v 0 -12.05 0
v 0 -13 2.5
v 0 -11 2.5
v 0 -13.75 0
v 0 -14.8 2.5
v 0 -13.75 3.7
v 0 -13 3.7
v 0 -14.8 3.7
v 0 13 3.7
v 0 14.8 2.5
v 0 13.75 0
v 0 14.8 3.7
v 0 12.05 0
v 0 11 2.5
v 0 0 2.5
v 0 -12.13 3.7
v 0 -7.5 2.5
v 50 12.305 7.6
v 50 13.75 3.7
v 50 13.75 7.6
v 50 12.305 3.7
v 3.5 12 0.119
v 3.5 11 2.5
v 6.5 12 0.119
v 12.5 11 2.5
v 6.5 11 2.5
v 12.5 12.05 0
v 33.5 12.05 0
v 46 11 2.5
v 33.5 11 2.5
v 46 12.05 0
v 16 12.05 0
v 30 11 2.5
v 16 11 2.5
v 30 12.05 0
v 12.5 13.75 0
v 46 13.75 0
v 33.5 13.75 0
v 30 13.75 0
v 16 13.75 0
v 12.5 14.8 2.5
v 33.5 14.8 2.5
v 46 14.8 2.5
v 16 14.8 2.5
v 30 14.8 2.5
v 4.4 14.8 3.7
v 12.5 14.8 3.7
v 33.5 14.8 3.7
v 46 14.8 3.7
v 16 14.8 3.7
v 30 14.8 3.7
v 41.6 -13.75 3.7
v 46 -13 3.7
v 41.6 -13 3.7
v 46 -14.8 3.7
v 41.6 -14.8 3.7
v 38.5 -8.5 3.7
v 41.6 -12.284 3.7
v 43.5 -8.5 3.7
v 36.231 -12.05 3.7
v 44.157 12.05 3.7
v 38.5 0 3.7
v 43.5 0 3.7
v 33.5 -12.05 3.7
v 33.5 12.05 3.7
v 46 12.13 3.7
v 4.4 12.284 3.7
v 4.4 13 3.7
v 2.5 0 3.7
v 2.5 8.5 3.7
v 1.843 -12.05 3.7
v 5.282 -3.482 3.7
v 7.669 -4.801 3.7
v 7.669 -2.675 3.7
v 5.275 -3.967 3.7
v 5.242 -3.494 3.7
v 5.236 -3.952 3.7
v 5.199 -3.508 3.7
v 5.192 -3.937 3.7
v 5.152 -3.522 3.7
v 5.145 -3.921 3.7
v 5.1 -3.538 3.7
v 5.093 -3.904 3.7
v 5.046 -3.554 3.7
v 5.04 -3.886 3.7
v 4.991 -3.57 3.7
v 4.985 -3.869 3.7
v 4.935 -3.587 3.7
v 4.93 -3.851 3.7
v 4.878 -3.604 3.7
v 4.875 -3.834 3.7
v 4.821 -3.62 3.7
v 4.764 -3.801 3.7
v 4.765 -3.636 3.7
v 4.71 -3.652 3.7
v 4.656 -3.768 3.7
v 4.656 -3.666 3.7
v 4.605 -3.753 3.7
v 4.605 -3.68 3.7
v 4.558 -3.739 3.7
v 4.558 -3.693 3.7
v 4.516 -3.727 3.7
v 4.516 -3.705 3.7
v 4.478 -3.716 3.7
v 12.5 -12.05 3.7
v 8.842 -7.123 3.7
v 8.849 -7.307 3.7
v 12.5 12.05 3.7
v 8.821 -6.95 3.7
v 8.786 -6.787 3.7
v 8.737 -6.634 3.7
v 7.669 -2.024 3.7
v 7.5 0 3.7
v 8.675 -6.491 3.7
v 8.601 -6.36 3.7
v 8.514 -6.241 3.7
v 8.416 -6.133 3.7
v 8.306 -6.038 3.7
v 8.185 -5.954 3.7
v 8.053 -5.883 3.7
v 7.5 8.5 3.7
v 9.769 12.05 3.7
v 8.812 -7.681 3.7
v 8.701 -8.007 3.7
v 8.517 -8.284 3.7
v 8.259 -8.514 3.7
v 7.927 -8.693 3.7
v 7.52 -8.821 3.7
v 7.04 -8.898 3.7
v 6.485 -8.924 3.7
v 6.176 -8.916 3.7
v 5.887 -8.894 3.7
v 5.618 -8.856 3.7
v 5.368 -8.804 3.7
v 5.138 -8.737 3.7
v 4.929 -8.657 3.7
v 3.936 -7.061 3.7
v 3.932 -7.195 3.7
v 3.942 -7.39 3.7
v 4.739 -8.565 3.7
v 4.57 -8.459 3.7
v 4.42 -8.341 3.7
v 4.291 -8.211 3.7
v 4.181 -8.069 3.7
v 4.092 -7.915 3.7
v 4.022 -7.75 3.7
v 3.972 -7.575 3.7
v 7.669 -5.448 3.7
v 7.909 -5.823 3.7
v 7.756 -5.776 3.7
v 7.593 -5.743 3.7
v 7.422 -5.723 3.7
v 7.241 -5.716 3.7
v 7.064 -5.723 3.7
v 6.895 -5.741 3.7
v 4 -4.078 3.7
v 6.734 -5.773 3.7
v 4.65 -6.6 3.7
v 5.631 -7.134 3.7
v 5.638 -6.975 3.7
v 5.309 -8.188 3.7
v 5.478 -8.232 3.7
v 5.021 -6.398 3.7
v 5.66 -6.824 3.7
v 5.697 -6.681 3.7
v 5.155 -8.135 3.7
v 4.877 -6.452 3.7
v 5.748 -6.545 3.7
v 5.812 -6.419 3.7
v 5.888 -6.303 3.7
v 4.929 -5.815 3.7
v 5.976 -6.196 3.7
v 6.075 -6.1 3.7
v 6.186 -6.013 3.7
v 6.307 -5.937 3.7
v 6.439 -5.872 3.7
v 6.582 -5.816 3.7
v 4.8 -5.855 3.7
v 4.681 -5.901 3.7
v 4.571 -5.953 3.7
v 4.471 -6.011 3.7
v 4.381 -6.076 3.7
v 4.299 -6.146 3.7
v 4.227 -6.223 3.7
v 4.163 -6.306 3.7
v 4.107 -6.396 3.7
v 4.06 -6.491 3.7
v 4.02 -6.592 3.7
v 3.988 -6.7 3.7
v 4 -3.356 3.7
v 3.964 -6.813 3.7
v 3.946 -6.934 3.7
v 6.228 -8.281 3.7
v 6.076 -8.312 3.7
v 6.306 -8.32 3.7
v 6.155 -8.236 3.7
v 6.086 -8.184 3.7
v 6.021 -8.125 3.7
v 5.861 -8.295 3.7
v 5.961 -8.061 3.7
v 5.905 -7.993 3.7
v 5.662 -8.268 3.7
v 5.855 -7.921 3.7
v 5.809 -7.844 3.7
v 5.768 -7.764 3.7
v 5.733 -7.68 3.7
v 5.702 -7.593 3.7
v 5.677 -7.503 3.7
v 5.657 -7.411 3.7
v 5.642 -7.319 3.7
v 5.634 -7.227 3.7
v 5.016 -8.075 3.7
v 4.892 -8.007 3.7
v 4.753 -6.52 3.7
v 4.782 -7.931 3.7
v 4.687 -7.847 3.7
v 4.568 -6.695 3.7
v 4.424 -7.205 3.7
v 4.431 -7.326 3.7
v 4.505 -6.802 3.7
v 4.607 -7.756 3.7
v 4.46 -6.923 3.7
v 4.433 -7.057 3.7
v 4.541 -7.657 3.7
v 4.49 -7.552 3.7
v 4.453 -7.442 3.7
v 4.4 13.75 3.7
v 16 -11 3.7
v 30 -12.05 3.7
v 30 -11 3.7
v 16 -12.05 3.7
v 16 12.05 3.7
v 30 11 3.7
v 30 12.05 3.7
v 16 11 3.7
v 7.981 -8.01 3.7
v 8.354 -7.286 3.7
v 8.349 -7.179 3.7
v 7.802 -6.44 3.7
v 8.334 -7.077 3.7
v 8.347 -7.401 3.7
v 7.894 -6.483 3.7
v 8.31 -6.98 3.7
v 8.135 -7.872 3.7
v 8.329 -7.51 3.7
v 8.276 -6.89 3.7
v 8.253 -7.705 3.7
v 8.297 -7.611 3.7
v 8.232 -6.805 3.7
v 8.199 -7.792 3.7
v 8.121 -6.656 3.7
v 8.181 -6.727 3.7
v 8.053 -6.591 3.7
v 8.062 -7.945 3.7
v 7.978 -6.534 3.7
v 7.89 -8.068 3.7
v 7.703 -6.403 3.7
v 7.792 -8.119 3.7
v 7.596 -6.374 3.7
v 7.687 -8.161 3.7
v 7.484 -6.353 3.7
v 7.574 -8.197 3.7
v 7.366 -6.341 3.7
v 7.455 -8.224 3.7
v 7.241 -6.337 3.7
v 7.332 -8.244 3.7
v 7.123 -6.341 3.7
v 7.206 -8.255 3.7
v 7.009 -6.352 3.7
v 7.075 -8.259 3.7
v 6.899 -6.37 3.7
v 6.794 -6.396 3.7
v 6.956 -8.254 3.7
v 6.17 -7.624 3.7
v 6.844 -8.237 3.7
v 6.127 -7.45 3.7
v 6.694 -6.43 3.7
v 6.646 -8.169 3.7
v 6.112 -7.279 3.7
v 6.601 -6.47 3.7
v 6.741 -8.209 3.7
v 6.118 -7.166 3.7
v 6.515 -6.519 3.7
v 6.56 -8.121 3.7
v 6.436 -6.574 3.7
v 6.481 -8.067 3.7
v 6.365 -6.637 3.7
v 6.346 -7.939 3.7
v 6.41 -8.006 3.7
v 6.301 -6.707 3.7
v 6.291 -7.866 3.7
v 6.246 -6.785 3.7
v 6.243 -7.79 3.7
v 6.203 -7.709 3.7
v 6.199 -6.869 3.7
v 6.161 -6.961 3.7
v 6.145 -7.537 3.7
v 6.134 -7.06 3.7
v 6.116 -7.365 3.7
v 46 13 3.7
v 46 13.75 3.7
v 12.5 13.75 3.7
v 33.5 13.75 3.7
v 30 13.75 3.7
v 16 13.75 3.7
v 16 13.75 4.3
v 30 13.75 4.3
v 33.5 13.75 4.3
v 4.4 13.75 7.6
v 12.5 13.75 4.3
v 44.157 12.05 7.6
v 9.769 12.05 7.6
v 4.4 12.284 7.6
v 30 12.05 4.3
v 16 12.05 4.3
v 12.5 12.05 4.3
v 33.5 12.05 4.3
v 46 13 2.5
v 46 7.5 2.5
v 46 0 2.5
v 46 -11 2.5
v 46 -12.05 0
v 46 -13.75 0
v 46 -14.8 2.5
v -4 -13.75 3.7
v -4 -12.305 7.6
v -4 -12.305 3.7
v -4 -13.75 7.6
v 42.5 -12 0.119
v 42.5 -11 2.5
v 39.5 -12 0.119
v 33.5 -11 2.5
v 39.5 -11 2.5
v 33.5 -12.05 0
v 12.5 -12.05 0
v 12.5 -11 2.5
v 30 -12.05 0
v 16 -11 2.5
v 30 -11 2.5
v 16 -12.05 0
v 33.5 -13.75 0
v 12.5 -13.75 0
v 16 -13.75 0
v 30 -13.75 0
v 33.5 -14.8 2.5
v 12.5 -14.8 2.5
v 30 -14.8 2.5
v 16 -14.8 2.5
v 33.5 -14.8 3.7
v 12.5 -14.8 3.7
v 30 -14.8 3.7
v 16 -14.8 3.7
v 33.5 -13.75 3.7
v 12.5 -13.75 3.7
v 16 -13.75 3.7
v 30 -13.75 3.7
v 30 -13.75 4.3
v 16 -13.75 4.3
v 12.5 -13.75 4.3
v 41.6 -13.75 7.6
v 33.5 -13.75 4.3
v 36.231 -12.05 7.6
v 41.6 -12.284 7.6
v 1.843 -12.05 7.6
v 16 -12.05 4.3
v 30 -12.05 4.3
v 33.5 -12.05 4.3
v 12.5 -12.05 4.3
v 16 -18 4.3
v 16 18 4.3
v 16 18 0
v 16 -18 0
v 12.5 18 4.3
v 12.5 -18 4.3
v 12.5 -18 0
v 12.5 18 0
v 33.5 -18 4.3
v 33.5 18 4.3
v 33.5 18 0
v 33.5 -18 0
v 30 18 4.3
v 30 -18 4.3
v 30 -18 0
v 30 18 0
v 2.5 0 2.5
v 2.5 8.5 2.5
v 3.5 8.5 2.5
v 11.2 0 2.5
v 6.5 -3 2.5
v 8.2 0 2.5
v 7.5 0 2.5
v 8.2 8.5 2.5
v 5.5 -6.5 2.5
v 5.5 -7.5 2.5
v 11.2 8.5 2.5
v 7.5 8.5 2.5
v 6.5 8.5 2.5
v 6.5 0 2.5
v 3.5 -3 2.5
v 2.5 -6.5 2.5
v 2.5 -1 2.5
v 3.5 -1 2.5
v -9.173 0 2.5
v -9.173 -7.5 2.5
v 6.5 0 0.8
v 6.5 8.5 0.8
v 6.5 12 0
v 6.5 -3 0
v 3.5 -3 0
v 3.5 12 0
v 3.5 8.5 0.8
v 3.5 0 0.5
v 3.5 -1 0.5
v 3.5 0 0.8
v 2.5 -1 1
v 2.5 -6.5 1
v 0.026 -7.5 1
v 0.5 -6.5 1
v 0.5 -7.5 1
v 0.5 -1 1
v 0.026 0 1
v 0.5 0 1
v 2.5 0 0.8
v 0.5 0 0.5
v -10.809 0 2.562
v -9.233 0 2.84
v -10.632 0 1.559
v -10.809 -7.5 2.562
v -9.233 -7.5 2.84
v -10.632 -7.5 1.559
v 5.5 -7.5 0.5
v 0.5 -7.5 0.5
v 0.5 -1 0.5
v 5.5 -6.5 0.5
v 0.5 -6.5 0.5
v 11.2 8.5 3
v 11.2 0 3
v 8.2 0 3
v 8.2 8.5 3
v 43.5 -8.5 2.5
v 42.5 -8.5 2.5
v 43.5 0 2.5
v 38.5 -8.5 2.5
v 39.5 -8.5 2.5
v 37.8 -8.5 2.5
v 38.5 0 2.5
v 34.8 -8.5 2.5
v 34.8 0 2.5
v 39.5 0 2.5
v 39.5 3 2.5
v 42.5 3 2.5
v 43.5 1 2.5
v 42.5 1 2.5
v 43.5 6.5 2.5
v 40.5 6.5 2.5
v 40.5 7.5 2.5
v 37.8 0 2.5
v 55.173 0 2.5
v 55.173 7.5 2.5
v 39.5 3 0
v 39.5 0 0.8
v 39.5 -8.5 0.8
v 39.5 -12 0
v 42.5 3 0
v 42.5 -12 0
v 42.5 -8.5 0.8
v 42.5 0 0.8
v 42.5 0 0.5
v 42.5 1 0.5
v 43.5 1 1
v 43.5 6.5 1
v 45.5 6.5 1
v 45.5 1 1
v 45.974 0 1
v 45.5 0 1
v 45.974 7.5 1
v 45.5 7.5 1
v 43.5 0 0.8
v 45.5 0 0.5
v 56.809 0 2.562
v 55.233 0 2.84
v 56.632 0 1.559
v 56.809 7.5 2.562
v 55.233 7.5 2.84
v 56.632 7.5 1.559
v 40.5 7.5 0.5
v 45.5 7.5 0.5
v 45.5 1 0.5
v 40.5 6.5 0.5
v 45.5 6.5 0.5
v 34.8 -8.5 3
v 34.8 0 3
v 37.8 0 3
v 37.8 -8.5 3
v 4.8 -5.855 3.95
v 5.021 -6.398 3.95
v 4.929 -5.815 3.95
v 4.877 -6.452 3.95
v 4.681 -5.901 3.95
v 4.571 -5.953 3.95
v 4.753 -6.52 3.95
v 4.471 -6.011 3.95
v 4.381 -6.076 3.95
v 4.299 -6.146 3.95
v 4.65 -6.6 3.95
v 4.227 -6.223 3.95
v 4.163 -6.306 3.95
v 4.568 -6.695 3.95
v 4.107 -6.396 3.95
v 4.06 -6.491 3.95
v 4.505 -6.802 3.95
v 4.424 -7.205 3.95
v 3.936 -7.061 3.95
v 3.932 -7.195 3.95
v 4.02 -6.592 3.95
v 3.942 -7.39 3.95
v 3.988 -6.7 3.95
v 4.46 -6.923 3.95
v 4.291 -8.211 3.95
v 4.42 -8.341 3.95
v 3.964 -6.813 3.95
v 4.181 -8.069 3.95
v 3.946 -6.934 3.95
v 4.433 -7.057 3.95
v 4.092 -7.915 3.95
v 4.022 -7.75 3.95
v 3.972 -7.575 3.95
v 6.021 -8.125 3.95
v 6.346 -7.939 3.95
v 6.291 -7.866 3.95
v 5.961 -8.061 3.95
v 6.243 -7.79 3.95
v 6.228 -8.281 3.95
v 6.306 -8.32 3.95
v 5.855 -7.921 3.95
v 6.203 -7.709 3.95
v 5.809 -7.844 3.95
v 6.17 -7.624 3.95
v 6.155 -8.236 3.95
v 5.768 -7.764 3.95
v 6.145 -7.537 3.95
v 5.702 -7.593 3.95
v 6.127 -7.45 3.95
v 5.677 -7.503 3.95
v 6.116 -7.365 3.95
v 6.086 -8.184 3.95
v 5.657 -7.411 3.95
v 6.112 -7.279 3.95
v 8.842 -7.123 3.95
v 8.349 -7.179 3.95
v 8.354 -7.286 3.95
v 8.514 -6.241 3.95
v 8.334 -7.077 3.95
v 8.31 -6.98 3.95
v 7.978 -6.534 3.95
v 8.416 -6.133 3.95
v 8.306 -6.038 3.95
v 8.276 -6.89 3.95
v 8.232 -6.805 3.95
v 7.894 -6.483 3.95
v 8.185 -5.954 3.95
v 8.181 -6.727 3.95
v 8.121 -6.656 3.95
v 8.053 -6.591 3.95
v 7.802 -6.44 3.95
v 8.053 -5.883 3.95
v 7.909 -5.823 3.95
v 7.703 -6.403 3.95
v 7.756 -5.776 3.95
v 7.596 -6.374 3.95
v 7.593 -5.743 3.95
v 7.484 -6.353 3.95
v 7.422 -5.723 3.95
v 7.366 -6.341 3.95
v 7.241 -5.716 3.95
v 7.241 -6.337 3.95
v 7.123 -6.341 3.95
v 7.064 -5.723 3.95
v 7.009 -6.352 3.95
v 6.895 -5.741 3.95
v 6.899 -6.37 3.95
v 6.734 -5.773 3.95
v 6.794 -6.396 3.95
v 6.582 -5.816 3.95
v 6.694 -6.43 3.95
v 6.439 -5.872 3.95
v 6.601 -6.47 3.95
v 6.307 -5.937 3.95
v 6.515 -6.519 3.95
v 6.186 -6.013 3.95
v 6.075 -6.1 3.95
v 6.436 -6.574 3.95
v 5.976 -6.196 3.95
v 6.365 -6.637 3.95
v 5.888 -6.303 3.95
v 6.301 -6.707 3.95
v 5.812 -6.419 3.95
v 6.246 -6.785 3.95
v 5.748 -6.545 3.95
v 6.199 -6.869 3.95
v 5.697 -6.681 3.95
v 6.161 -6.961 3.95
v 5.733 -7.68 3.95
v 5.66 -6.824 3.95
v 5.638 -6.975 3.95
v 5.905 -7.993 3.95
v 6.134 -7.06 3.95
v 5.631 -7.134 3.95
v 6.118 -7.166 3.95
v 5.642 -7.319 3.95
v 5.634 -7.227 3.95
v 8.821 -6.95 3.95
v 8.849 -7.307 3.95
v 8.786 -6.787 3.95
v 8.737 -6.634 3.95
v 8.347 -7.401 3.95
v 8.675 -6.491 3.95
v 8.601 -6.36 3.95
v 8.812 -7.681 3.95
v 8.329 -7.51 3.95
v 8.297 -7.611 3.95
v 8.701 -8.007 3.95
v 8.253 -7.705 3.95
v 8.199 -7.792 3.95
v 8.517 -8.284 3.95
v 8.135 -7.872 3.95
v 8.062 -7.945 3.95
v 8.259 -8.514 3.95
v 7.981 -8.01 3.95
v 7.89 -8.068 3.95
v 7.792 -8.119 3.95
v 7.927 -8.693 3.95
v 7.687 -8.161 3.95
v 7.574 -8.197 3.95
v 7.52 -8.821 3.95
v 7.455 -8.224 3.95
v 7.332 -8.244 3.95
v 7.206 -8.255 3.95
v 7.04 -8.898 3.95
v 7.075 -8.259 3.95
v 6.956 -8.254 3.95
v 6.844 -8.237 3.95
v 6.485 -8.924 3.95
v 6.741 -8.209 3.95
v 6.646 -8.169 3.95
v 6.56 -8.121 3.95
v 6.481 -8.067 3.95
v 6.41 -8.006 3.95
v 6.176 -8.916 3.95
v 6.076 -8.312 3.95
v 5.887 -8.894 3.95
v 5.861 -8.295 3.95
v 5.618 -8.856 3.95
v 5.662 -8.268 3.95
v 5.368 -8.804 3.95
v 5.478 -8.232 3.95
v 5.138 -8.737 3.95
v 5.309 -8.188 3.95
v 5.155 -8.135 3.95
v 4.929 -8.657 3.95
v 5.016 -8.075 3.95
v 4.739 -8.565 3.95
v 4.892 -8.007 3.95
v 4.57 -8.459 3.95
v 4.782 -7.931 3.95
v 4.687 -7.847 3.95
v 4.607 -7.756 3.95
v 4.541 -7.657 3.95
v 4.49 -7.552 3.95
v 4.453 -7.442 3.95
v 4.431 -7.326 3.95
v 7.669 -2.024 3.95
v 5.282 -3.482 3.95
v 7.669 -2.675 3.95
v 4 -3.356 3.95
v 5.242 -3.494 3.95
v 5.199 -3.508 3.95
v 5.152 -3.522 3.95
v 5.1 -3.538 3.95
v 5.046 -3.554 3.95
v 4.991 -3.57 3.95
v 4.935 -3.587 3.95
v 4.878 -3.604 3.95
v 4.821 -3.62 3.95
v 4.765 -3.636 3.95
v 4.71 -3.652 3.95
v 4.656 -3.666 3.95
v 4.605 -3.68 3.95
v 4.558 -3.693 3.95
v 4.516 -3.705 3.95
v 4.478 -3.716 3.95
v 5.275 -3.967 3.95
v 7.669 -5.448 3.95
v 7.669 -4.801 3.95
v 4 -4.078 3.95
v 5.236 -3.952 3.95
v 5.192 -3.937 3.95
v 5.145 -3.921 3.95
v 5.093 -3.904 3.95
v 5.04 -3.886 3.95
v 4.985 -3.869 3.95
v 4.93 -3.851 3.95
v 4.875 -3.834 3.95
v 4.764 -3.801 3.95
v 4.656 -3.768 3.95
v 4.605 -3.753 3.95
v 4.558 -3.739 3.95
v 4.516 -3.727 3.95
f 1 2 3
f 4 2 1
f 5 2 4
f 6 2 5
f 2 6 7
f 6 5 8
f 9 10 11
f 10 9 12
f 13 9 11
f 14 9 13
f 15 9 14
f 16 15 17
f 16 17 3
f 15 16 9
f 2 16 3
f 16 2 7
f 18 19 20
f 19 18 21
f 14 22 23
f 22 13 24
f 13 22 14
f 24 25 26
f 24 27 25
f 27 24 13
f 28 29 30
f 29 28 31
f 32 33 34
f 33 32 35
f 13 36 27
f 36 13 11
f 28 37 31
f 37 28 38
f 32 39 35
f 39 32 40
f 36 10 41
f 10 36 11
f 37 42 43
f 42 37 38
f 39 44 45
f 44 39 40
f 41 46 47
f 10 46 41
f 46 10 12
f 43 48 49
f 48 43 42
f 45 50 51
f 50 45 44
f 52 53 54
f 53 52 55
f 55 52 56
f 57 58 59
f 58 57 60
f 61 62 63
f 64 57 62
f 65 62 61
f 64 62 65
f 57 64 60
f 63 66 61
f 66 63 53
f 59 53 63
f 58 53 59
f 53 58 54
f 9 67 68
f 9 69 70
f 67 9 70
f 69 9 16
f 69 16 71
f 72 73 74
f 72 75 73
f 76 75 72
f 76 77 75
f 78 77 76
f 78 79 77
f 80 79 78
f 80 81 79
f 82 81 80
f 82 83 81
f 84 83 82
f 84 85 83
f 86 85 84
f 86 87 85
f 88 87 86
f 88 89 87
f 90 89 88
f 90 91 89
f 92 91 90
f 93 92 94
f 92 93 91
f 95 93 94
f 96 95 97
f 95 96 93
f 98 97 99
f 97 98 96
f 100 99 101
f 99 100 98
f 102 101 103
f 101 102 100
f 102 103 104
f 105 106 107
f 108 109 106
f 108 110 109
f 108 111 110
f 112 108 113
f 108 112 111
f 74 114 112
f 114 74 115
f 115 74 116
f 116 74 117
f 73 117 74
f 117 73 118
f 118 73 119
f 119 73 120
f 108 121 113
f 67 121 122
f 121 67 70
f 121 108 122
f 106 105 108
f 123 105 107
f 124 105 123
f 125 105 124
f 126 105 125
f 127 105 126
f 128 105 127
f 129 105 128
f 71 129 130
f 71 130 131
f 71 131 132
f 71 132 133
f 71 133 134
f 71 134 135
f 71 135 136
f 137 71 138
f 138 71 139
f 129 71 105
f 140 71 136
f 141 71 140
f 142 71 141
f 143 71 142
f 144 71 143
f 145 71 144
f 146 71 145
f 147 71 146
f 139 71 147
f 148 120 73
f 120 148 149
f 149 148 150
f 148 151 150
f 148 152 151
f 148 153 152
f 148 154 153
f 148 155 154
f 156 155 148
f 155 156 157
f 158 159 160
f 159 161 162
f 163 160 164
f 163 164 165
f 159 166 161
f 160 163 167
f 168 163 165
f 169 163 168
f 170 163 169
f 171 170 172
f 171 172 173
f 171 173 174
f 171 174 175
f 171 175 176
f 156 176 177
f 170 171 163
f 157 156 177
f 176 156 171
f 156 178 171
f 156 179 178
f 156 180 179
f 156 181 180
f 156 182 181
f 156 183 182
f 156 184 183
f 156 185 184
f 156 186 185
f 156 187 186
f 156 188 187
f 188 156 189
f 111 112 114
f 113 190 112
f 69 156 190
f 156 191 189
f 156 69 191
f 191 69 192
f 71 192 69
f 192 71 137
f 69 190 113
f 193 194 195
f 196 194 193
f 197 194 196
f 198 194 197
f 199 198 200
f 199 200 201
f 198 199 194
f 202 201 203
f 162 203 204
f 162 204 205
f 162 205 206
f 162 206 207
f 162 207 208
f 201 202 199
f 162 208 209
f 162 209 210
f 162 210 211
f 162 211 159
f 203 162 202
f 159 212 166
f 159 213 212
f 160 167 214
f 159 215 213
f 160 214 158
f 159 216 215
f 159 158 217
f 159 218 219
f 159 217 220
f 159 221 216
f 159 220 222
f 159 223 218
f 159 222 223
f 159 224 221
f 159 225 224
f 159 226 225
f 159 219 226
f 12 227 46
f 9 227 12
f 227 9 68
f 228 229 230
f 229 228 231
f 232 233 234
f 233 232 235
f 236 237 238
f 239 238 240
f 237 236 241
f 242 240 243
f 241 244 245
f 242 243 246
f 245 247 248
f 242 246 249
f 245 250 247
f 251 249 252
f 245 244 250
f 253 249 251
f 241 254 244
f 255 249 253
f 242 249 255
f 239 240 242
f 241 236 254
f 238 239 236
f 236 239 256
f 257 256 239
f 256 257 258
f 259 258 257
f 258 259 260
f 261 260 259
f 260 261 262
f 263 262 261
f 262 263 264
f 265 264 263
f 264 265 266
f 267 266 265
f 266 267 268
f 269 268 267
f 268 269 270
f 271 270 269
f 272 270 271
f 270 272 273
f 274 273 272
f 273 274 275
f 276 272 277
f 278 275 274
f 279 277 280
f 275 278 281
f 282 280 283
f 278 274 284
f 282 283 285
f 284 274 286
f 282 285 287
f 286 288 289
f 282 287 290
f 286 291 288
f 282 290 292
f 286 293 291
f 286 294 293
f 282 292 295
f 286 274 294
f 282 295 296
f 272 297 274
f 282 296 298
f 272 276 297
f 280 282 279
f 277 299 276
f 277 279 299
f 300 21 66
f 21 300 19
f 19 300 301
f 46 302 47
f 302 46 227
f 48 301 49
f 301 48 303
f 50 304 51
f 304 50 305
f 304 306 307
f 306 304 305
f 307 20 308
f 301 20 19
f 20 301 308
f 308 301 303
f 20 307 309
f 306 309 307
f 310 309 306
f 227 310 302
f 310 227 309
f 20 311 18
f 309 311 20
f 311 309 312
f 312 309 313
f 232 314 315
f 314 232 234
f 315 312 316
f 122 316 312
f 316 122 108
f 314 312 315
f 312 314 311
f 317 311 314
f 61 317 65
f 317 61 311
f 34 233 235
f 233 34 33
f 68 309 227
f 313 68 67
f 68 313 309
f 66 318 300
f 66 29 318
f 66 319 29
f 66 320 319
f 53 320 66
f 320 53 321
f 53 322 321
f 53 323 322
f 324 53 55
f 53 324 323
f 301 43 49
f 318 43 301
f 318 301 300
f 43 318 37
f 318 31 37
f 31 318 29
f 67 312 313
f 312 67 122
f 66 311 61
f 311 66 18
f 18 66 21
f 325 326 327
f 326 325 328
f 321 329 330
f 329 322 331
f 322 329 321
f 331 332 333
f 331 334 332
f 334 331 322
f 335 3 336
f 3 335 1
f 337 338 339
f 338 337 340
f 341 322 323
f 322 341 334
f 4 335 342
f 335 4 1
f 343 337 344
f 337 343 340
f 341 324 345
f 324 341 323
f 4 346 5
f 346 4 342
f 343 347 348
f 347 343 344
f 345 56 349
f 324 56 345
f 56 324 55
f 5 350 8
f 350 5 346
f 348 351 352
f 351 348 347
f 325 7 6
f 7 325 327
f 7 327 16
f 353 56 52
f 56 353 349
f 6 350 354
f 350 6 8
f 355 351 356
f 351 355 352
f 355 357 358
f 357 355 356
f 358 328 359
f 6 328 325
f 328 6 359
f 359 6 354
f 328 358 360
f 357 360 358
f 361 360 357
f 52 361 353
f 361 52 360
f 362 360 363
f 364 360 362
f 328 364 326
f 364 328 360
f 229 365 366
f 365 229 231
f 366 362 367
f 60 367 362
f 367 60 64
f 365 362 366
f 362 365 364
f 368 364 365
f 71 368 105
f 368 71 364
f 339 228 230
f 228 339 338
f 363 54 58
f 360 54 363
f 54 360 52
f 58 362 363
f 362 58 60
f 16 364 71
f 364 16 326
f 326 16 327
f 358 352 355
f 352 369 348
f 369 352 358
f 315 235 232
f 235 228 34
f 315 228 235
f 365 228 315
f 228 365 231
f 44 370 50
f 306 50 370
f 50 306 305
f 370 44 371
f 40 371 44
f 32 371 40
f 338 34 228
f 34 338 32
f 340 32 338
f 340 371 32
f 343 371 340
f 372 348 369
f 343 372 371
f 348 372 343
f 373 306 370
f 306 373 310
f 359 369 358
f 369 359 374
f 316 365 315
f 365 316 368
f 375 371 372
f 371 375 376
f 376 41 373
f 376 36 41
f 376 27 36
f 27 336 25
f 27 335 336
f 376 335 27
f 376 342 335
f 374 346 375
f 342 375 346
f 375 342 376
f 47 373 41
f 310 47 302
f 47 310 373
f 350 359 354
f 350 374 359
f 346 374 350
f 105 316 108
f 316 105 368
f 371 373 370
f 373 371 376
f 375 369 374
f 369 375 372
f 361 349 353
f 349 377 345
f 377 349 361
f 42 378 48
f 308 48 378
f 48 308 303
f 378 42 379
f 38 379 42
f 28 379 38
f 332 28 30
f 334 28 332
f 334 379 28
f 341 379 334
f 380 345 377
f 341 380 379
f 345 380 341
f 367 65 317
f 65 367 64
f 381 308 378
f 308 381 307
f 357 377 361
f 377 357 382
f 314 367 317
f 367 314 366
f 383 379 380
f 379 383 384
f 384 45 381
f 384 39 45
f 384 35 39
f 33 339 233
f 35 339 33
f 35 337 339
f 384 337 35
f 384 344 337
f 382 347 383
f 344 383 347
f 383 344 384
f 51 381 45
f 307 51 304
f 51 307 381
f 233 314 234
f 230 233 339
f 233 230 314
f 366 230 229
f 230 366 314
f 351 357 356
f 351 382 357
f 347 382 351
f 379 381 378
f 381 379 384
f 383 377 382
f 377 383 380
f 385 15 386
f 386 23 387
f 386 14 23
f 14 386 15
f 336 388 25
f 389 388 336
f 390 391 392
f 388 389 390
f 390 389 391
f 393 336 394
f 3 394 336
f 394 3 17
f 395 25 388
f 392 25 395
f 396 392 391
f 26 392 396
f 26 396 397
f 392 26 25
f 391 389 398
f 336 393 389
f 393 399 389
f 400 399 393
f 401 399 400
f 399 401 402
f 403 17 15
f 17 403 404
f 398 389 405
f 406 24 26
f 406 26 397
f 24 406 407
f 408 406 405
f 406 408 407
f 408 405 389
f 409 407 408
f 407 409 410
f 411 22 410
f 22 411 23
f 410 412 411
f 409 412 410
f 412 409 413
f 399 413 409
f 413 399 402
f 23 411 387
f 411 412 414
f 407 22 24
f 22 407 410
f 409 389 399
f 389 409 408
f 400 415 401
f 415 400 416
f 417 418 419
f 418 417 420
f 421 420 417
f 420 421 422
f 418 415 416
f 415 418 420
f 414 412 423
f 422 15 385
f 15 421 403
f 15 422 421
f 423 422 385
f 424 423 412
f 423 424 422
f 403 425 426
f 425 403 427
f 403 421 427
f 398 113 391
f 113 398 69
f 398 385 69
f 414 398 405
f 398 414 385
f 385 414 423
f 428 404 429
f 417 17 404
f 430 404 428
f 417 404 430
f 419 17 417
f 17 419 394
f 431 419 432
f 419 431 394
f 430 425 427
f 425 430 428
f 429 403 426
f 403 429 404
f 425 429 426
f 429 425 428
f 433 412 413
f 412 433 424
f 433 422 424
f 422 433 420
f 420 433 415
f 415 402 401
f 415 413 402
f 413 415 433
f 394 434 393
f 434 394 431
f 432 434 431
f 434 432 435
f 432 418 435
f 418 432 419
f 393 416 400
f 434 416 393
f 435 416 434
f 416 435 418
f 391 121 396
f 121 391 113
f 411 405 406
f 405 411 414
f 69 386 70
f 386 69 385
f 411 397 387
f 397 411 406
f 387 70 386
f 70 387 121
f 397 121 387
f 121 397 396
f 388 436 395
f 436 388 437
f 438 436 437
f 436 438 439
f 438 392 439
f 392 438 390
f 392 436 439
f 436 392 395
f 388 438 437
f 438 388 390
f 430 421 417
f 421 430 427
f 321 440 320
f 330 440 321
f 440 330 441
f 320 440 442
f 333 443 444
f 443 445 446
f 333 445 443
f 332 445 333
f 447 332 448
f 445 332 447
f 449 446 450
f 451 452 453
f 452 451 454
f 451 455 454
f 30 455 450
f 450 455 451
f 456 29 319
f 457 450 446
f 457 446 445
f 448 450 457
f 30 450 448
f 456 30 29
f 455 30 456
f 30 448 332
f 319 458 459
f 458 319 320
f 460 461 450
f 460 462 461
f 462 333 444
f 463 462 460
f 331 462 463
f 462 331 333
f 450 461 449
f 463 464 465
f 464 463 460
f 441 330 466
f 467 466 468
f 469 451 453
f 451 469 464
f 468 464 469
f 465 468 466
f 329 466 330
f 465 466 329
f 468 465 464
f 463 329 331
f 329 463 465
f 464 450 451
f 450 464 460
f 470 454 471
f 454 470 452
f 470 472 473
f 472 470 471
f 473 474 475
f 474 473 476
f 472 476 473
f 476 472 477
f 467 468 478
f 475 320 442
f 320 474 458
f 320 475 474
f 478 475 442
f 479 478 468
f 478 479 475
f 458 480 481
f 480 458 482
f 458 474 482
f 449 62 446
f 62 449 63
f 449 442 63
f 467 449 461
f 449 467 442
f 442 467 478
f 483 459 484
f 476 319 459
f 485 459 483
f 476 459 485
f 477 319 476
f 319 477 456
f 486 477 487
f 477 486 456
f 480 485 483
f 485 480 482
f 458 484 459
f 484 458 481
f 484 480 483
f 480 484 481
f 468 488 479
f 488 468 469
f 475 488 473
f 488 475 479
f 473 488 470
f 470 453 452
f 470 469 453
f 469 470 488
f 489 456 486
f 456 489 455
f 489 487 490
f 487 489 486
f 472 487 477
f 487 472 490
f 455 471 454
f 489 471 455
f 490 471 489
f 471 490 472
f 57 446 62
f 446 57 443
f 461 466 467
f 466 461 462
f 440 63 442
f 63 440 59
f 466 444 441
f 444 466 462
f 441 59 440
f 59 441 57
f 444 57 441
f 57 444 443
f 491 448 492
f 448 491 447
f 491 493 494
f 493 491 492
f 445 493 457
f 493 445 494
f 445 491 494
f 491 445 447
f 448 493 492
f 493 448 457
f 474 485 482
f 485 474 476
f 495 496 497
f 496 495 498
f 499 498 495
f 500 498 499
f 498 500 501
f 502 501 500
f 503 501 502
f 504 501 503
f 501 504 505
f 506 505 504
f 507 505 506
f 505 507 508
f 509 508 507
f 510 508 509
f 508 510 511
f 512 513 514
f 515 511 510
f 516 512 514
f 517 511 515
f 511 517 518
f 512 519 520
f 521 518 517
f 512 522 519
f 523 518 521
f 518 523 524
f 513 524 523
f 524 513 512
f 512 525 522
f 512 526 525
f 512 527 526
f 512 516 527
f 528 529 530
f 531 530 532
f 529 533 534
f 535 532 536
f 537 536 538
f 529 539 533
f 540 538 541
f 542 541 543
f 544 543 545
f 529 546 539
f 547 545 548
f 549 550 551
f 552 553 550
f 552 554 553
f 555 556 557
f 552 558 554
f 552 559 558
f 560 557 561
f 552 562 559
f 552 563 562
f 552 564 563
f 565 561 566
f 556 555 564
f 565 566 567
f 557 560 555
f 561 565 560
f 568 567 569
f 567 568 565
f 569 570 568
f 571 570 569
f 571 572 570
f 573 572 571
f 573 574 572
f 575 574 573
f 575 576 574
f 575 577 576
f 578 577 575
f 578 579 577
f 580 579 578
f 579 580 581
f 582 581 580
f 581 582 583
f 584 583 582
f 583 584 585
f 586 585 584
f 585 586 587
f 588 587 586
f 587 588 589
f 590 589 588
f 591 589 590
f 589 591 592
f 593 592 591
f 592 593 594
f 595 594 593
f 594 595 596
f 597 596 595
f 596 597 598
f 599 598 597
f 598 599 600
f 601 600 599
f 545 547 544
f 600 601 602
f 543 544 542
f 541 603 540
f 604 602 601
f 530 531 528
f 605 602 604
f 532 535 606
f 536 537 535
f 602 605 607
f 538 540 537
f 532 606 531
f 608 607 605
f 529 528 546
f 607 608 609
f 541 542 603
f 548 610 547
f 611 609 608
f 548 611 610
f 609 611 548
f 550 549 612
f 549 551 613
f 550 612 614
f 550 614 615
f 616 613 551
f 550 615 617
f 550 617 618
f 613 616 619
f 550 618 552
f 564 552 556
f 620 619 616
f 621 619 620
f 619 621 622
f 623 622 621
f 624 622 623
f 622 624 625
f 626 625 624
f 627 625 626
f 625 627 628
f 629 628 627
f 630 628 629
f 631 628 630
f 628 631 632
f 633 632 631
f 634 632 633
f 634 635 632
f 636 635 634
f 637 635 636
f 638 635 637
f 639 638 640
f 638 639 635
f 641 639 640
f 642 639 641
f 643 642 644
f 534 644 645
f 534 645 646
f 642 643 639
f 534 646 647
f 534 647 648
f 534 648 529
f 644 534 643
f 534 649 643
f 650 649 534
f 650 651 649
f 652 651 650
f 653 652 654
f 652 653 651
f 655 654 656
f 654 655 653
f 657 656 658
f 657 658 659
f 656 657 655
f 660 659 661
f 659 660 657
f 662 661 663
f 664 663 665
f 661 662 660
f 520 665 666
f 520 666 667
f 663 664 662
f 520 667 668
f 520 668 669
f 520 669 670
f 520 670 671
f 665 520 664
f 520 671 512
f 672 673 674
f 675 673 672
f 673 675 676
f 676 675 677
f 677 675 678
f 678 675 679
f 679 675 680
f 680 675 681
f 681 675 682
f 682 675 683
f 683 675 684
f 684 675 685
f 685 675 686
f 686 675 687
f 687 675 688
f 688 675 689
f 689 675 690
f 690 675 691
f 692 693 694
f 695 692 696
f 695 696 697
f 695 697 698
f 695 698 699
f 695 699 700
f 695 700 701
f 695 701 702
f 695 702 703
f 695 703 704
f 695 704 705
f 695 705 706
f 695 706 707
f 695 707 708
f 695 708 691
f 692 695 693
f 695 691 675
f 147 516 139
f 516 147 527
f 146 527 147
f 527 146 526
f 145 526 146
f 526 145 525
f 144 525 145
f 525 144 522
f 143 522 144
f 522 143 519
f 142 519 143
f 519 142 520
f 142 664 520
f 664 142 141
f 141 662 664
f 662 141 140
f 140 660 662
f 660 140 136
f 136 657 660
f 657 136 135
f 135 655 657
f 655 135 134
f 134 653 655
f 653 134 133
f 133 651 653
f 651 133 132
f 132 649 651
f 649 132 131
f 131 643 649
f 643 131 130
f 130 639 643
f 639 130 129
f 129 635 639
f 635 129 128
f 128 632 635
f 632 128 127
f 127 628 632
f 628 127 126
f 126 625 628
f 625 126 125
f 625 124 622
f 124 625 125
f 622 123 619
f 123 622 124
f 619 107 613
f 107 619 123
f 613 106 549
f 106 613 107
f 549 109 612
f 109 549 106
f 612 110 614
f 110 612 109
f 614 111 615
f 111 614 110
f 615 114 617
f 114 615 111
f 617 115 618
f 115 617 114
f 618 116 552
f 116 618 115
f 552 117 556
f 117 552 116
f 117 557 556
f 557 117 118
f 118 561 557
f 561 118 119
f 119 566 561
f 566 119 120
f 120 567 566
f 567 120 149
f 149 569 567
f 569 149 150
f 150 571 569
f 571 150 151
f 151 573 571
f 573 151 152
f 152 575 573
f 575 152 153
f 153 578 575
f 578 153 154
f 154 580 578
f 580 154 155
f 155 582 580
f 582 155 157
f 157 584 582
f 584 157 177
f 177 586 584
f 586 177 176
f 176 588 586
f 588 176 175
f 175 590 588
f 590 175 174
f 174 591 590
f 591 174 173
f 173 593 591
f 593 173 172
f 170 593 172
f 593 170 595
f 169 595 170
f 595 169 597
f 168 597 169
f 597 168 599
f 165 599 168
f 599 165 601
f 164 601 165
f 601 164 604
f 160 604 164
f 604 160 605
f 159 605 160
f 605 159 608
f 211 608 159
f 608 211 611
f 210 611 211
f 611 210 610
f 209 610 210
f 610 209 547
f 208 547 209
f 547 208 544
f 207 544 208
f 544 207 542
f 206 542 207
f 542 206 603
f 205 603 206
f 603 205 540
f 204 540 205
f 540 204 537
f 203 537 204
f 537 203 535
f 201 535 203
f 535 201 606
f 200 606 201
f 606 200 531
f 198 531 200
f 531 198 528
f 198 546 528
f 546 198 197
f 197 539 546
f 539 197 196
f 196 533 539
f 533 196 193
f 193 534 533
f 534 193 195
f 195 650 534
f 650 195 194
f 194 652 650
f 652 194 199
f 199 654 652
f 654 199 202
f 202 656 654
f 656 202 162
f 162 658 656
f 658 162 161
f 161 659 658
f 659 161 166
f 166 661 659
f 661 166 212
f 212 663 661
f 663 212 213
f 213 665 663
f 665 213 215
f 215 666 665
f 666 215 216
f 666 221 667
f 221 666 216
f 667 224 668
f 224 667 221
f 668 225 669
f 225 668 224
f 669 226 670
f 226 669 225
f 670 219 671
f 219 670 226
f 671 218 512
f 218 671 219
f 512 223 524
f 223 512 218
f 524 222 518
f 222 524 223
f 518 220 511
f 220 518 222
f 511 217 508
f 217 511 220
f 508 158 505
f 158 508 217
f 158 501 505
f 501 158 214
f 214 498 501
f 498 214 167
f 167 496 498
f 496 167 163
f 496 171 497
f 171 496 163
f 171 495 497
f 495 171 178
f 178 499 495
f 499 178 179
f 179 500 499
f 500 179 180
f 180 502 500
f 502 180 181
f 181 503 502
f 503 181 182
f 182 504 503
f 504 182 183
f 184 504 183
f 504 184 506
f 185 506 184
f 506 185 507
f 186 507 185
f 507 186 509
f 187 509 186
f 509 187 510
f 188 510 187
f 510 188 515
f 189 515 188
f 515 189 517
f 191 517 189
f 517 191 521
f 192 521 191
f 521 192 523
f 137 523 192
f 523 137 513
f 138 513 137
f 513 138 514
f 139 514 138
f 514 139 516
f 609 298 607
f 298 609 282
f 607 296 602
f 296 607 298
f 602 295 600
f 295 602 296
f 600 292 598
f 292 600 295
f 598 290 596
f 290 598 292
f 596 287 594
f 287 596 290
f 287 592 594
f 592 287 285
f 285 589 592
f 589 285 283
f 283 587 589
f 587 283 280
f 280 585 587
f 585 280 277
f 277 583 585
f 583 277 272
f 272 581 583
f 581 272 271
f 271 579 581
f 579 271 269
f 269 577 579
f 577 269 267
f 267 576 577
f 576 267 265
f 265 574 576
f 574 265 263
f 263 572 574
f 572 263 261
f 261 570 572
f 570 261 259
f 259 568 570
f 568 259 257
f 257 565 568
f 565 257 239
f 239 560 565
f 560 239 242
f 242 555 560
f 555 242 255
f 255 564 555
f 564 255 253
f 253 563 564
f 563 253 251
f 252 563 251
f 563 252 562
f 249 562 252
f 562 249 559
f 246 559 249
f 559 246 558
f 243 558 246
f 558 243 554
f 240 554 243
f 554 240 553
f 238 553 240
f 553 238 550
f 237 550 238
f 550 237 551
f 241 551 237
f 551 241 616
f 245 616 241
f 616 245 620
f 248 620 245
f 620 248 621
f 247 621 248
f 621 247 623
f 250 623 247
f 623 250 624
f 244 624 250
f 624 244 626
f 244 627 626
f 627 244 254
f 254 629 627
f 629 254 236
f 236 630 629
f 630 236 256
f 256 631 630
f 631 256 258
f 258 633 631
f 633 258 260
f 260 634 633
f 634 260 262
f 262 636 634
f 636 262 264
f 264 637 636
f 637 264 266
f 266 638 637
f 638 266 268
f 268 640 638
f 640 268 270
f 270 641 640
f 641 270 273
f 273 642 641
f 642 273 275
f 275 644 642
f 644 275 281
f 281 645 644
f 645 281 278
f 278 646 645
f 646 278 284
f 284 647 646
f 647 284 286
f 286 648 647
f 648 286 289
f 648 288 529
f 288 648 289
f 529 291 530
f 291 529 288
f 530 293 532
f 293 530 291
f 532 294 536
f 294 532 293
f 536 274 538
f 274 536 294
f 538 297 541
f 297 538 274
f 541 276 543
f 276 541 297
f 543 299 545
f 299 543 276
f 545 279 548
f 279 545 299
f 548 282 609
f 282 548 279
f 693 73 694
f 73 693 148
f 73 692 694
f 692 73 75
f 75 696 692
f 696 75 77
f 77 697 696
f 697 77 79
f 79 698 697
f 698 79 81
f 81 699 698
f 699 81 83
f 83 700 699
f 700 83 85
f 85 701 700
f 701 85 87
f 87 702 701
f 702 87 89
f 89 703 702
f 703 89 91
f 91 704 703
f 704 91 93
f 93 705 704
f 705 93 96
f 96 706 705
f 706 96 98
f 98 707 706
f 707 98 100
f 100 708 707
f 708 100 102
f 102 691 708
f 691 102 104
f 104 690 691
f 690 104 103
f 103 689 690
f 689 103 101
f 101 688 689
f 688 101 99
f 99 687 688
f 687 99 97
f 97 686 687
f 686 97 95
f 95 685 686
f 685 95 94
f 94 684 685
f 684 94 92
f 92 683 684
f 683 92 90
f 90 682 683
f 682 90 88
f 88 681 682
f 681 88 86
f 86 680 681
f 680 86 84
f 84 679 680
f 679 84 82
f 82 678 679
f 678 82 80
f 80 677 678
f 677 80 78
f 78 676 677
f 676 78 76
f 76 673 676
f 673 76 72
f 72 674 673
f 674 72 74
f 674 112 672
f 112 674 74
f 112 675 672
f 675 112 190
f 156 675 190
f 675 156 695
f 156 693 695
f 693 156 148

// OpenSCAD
gauge=24;
// testlaius
/*translate([30,-gauge/2,4])
 cube([4,gauge,4]);*/
//translate([0, 50, 0])
 sirge(leng = 50, supp = 1);
/*translate([-0,0,0])
 rotate([0,0,180])
  sirge(leng = 50, supp = 1);*/

module sirge(leng=225, supp=5)
{
  translate([0,gauge/2+3,0])
   roobas(leng);
  translate([leng-4,-gauge/2-3,0])
   rotate([0,0,180])
    roobas(leng);
  samm = (leng-31.5)/supp - 1;
  for(n = [0 : supp])
  {
    translate([12.5 + samm*n, 0, 0])
     suurpalk();
  }
  translate([0, 0, 0])
   ots();
  translate([leng-4, 0, 0])
   rotate([0,0,180])
    ots();
  translate([4,-2,3.7])
   scale(0.5)
    rotate([0,0,-90])
     linear_extrude(0.5)
      text("v9");
}

module profiil() {
 udx=1.7;
 udy=7.6-1.2-2.5;
 mdx=3.8;
 mdy=1.2;
 ldx=1.7;
 ldy=2.5;
 translate([0,mdy+ldy,0])
 union() {
  // upper (rail)
  translate([0,udy/2,0])
   square([udx,udy], true);
  // middle (below rail)
  translate([0,-mdy/2,0])
   square([mdx,mdy], true);
  // lower part
  // 4---1
  //  3-2
  translate([0,-mdy-ldy/2,0])
   polygon([
    [mdx/2,ldy/2],//1
    [ldx/2,-ldy/2],//2
    [-ldx/2,-ldy/2],//3
    [-mdx/2,ldy/2]]);//4
 }
}
//profiil();
module roobas(leng = 225)
{
  len = leng;
  u_w = 1.7; // upper wid
  m_w = 3.80; // middle wid
  m_h = 1.2; // middle hei
  h = 7.6; //whole hei
  m_l = 2.5; // middle lower
  translate([0,u_w-m_w,0])
  difference() 
  {
    rotate([90, 0, 90])
    linear_extrude(len)
    profiil();
    translate([-0.1, -2, 3.7])
     cube([4.5, 4, 4]);
    translate([leng-4, -2, -0.3])
     cube([4.2, 4, 4]);
    // cut the rail
    translate([4,-2.6,3.7])
     rotate([0,0,-2.5])
      cube([6,2,4]);
    translate([leng-5.8,-2.85,3.7])
     rotate([0,0,2.5])
      cube([6,2,4]);
  }  
}
//roobas();
module palk()
{
 translate([0,0,2.64])
  cube([6.64, 42.3, 1.64]);
}
//palk();
module suurpalk()
{
 vo=6;
 translate([0,-(gauge/2+vo),0])
  cube([3.5, gauge+vo*2, 4.3]);
}
//suurpalk();
module ots()
{
  ol=gauge+2;
  dy=-8;
  ddy=0.5;
    difference()
    {
     union()
     {
       // plaat
      translate([0, -ol/2, 2.5])
       cube([16,ol,1.2]);
      // aas
      translate([3.5,-ddy*6,0])
       cube([3,15,3]);
      // klamber
      //translate([-3.0,-8,1])
       //cube([7,7,1.5]);
      // keel
      translate([-10.5,dy+ddy,1])
       cube([13,7.5,1.5]);
      // keele tipp
      rotate([0,-10,0])
       translate([-10.2,dy+ddy,3.3])
        cube([1.6,7.5,1.1]);
      // support
      translate([0.5,-1,0.5])
       cube([6,1,2.5]);
      translate([0.5,-7.5,0.5])
       cube([5,1,2.5]);
     }
     union()
     {
       // auk läbi plaadi
       translate([2.5,0,0.8])
        cube([5,8.5,3.5]);
       // süvend all
       translate([8.2,0,0.6])
        cube([3,8.5,2.4]);
       // tipu lõige
       rotate([0,10,0])
        translate([-12,dy,1.2])
         cube([4,8,2]);
       // klambri lõige
       rotate([0,3,0])
        translate([-12,dy,-1])
         cube([12,8.5,2]);
     }
    }
}
//ots();
